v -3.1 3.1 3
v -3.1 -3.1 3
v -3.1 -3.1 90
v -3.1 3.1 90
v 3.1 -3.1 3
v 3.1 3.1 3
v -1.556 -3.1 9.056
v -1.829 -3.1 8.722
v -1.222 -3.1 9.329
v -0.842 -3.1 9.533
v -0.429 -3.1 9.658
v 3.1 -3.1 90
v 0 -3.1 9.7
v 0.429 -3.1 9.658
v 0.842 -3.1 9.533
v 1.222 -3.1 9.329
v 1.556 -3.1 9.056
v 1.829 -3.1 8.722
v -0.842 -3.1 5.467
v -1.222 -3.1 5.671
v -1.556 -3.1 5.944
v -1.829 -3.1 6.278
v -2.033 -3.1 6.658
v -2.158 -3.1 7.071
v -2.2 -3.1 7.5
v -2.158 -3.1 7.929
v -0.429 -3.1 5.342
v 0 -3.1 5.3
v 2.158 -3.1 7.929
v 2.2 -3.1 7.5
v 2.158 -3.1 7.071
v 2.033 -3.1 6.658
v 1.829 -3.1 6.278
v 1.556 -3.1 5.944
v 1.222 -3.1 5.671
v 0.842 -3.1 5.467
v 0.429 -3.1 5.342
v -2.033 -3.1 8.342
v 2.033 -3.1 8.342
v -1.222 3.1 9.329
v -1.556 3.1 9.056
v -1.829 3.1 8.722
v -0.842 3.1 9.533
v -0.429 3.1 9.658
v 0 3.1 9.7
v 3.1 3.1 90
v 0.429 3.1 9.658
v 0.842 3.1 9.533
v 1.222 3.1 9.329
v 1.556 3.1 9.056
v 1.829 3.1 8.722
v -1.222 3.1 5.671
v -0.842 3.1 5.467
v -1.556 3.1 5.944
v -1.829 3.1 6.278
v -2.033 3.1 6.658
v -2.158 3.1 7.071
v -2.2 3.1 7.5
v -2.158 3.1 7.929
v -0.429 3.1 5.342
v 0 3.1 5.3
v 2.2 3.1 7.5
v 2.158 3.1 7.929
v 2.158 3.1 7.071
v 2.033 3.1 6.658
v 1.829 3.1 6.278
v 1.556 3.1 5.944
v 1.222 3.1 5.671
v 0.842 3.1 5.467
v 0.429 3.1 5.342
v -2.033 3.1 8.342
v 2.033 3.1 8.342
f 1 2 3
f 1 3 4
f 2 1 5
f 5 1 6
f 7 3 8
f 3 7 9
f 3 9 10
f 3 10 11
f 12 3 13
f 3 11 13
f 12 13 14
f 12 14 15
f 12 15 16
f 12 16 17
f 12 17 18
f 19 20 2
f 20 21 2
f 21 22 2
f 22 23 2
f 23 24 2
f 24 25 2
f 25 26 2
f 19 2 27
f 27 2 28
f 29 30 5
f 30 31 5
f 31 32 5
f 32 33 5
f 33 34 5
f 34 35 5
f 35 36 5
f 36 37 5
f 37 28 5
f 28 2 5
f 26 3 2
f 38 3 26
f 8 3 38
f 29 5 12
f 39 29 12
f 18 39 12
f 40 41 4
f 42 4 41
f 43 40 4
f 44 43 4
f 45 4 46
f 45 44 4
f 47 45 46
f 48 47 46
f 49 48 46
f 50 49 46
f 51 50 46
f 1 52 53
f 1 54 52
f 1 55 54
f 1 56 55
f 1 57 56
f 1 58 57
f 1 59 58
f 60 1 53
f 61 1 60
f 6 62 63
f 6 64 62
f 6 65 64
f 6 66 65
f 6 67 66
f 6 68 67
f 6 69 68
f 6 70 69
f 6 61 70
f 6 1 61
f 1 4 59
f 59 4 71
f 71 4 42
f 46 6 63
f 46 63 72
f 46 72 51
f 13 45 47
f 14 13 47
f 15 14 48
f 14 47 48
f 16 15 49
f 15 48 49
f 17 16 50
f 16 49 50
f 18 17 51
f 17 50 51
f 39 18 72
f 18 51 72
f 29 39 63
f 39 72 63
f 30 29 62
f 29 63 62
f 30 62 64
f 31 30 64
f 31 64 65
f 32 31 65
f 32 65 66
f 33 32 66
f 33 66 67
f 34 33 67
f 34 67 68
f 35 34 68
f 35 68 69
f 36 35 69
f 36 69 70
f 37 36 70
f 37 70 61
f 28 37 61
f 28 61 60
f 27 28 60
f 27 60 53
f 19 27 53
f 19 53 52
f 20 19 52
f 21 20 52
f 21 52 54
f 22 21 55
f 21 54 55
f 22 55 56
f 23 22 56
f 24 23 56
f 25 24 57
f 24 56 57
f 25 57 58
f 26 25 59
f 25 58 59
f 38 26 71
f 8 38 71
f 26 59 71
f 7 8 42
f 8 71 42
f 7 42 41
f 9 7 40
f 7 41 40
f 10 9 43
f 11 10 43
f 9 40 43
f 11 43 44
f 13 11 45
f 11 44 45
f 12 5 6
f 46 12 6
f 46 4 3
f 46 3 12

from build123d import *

# Parameters (mm, degrees)
SKETCH1_W           = 6.2
SKETCH1_H           = 6.2
BOSS_EXTRUDE1_DEPTH = 90
SKETCH2_W           = 6.2
SKETCH2_H           = 3
SKETCH2_R           = 2.2
CUT_EXTRUDE1_DEPTH  = 10


with BuildPart() as part:
    # Sketch1 → Boss-Extrude1 (new body)
    with BuildSketch(Plane.XY):
        Rectangle(SKETCH1_W, SKETCH1_H)
    extrude(amount=BOSS_EXTRUDE1_DEPTH)

    # Sketch2 → Cut-Extrude1 (cut)
    with BuildSketch(Plane(origin=(0, 3.1, 0), x_dir=(1, 0, 0), z_dir=(0, 1, 0))):
        with Locations((0, -1.5)):
            Rectangle(SKETCH2_W, SKETCH2_H)
        with Locations(Location((0, -7.5, 0), (0, 0, 270))):
            Circle(SKETCH2_R)
    extrude(amount=-CUT_EXTRUDE1_DEPTH, mode=Mode.SUBTRACT)


solid = part.part
